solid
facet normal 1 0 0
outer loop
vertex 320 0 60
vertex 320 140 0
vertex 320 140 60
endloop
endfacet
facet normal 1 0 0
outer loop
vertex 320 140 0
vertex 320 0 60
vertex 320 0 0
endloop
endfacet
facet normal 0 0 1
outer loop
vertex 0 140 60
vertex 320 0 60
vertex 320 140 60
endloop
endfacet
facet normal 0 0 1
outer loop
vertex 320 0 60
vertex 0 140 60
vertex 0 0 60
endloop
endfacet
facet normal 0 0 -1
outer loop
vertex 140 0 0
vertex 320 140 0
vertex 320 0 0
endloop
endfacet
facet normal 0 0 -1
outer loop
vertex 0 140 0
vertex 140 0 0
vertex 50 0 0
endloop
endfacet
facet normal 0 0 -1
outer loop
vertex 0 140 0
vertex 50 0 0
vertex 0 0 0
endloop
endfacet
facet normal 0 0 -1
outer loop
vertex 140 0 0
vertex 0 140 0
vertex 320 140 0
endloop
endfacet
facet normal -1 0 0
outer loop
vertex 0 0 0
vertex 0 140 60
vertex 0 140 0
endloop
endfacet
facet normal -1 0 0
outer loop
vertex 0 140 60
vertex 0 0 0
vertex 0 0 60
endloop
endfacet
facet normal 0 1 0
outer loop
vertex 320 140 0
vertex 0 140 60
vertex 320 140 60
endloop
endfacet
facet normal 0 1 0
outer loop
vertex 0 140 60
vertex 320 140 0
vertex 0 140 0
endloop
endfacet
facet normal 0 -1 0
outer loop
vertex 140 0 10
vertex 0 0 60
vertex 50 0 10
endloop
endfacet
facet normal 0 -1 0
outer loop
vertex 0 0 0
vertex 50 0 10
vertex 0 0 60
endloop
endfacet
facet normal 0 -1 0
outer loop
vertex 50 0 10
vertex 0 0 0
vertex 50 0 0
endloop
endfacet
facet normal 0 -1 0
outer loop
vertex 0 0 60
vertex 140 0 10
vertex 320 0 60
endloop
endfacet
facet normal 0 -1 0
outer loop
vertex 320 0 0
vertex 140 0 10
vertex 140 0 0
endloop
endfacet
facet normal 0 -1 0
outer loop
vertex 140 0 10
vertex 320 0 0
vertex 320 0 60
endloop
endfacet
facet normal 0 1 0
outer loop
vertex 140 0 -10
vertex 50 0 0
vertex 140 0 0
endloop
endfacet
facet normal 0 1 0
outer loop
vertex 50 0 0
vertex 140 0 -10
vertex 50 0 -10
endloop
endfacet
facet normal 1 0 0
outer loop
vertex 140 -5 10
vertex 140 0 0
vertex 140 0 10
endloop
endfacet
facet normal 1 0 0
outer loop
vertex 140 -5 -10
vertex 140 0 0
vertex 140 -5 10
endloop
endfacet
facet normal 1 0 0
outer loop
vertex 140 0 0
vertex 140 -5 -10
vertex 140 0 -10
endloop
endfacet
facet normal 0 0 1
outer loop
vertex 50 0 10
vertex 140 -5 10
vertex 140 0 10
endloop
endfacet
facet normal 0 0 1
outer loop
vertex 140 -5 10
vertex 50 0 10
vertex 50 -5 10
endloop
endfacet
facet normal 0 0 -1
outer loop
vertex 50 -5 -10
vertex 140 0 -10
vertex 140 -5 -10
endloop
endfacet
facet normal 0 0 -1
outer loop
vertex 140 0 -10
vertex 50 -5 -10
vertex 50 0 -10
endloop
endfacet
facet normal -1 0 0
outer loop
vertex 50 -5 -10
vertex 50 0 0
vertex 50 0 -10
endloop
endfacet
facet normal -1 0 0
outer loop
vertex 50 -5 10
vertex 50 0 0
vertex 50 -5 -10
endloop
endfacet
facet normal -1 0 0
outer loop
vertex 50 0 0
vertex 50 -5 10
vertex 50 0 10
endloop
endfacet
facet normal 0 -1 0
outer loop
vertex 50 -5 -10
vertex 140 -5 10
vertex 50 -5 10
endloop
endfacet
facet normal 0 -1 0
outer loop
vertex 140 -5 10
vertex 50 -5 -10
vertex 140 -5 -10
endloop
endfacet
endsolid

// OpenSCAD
// Graphics Card (GPU) Model
// Reference dimensions for full-sized GPU
// Max: 320mm length, 3-slot (60mm) width

module gpu() {
    // GPU Dimensions (high-end 3-slot card)
    gpu_length = 320;      // X - card length
    gpu_height = 140;      // Y - PCB + cooler height
    gpu_width = 60;        // Z - 3 slots (~20mm each)

    // PCIe bracket dimensions
    bracket_width = 20;
    bracket_height = 120;
    bracket_thickness = 2;

    // I/O ports area
    io_height = 40;
    io_depth = 50;

    union() {
        // Main GPU body (shroud/cooler)
        color("dimgray") {
            cube([gpu_length, gpu_height, gpu_width]);
        }

        // PCIe bracket (at rear)
        color("silver") {
            translate([gpu_length - bracket_thickness, 0, 0]) {
                cube([bracket_thickness, bracket_height, gpu_width]);
            }
        }

        // Display I/O ports indication
        color("black") {
            translate([gpu_length - 5, 10, 5]) {
                cube([5, io_height, io_depth]);
            }
        }

        // PCIe connector (gold fingers)
        color("gold") {
            translate([50, -5, gpu_width/2 - 40]) {
                cube([90, 5, 20]);
            }
        }
    }
}

// Preview
gpu();
